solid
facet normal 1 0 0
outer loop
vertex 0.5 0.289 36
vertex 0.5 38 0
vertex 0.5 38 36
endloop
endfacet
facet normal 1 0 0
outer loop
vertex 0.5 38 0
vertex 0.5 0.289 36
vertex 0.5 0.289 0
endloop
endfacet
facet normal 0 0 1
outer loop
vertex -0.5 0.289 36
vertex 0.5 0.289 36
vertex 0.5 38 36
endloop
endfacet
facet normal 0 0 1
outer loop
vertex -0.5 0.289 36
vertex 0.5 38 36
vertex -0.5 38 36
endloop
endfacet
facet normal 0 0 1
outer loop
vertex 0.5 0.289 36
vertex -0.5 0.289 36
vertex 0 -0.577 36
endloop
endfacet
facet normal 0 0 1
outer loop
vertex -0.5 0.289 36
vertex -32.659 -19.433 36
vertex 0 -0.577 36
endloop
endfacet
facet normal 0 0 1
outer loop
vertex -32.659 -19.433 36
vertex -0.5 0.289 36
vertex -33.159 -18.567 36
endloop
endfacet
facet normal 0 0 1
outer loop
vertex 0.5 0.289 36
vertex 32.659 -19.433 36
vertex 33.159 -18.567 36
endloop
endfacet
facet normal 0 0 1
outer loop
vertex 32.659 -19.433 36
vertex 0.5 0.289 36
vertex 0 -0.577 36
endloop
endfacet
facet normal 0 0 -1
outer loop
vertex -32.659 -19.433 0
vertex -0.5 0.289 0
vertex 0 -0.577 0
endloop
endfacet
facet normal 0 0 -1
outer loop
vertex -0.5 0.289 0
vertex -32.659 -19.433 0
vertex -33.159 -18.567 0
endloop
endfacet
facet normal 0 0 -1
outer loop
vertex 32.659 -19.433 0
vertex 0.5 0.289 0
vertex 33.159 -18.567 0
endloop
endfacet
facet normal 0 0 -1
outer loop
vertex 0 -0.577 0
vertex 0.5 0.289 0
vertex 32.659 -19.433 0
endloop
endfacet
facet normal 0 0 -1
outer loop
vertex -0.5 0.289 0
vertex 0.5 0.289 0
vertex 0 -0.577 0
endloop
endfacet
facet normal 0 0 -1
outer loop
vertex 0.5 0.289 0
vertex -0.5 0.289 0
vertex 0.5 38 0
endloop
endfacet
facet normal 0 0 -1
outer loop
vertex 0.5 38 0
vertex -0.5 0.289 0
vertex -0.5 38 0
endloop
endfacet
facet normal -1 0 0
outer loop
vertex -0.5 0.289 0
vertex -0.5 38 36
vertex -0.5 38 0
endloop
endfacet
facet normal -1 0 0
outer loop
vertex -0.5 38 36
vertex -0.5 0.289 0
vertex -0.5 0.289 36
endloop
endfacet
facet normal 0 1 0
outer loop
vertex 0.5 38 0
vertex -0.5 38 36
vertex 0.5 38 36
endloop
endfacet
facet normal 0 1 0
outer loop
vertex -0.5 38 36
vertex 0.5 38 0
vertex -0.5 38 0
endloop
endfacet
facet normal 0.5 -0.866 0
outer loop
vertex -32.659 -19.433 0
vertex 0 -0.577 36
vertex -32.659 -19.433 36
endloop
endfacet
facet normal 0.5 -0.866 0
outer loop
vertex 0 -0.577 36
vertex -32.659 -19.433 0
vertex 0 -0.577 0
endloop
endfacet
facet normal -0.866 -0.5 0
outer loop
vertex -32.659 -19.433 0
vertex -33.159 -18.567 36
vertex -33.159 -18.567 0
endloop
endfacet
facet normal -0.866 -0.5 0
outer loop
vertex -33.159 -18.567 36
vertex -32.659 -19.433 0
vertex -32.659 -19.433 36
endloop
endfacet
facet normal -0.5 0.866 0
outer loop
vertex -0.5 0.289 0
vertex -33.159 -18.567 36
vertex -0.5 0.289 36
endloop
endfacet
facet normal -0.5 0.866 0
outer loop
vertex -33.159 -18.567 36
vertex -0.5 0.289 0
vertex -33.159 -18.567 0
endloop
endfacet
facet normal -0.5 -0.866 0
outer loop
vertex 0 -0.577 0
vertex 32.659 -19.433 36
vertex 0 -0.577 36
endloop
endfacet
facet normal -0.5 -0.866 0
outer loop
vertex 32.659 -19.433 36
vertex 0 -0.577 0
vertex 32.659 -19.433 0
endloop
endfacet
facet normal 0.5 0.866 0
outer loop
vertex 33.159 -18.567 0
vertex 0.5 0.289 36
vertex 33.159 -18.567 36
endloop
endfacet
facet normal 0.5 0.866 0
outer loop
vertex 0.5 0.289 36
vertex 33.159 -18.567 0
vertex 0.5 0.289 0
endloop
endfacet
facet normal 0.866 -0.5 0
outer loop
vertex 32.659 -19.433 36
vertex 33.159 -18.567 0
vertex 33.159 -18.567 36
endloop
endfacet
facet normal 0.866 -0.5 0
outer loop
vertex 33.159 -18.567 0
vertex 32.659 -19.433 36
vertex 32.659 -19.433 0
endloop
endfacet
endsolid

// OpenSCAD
// This work is licensed under the Creative Commons Attribution 4.0 International License.
// To view a copy of this license, visit http://creativecommons.org/licenses/by/4.0/
// or send a letter to Creative Commons, PO Box 1866, Mountain View, CA 94042, USA.

// Select US oz size, or 0 to use custom measurements.
canSize = 5.5; //[0,3,5.5]

// Only used if Predefined Size is 0
customHeight = 36;
// Only used if Predefined Size is 0
customDiameter = 76;

// Number of portions to create. If your cat needs a half can, set to 4 and give them two portions.
numberOfPortions = 3;//[3:1:10]

// Make thicker if your printer is having problems.
wallThickness = 1;

module dragons() {
  // Beyond this point be tunables that you shouldn't normally tune.
}
spokeCount=numberOfPortions;

// These numbers need measurements
threeOzHeight = 36;
fiveOzHeight = 36;
height = canSize == 5.5 ? fiveOzHeight : canSize == 3 ? threeOzHeight : customHeight;

// These numbers need measurements
threeOzDiameter = 58;
fiveOzDiameter = 76;
diameter = canSize == 5.5 ? fiveOzDiameter : canSize == 3 ? threeOzDiameter : customDiameter;

radius = diameter/2;

for(legRotation = [0 : 360/spokeCount: 360-spokeCount]) {
    rotate([0,0,legRotation]) translate([-wallThickness/2,0,0]) cube([wallThickness,radius,height]);
}
